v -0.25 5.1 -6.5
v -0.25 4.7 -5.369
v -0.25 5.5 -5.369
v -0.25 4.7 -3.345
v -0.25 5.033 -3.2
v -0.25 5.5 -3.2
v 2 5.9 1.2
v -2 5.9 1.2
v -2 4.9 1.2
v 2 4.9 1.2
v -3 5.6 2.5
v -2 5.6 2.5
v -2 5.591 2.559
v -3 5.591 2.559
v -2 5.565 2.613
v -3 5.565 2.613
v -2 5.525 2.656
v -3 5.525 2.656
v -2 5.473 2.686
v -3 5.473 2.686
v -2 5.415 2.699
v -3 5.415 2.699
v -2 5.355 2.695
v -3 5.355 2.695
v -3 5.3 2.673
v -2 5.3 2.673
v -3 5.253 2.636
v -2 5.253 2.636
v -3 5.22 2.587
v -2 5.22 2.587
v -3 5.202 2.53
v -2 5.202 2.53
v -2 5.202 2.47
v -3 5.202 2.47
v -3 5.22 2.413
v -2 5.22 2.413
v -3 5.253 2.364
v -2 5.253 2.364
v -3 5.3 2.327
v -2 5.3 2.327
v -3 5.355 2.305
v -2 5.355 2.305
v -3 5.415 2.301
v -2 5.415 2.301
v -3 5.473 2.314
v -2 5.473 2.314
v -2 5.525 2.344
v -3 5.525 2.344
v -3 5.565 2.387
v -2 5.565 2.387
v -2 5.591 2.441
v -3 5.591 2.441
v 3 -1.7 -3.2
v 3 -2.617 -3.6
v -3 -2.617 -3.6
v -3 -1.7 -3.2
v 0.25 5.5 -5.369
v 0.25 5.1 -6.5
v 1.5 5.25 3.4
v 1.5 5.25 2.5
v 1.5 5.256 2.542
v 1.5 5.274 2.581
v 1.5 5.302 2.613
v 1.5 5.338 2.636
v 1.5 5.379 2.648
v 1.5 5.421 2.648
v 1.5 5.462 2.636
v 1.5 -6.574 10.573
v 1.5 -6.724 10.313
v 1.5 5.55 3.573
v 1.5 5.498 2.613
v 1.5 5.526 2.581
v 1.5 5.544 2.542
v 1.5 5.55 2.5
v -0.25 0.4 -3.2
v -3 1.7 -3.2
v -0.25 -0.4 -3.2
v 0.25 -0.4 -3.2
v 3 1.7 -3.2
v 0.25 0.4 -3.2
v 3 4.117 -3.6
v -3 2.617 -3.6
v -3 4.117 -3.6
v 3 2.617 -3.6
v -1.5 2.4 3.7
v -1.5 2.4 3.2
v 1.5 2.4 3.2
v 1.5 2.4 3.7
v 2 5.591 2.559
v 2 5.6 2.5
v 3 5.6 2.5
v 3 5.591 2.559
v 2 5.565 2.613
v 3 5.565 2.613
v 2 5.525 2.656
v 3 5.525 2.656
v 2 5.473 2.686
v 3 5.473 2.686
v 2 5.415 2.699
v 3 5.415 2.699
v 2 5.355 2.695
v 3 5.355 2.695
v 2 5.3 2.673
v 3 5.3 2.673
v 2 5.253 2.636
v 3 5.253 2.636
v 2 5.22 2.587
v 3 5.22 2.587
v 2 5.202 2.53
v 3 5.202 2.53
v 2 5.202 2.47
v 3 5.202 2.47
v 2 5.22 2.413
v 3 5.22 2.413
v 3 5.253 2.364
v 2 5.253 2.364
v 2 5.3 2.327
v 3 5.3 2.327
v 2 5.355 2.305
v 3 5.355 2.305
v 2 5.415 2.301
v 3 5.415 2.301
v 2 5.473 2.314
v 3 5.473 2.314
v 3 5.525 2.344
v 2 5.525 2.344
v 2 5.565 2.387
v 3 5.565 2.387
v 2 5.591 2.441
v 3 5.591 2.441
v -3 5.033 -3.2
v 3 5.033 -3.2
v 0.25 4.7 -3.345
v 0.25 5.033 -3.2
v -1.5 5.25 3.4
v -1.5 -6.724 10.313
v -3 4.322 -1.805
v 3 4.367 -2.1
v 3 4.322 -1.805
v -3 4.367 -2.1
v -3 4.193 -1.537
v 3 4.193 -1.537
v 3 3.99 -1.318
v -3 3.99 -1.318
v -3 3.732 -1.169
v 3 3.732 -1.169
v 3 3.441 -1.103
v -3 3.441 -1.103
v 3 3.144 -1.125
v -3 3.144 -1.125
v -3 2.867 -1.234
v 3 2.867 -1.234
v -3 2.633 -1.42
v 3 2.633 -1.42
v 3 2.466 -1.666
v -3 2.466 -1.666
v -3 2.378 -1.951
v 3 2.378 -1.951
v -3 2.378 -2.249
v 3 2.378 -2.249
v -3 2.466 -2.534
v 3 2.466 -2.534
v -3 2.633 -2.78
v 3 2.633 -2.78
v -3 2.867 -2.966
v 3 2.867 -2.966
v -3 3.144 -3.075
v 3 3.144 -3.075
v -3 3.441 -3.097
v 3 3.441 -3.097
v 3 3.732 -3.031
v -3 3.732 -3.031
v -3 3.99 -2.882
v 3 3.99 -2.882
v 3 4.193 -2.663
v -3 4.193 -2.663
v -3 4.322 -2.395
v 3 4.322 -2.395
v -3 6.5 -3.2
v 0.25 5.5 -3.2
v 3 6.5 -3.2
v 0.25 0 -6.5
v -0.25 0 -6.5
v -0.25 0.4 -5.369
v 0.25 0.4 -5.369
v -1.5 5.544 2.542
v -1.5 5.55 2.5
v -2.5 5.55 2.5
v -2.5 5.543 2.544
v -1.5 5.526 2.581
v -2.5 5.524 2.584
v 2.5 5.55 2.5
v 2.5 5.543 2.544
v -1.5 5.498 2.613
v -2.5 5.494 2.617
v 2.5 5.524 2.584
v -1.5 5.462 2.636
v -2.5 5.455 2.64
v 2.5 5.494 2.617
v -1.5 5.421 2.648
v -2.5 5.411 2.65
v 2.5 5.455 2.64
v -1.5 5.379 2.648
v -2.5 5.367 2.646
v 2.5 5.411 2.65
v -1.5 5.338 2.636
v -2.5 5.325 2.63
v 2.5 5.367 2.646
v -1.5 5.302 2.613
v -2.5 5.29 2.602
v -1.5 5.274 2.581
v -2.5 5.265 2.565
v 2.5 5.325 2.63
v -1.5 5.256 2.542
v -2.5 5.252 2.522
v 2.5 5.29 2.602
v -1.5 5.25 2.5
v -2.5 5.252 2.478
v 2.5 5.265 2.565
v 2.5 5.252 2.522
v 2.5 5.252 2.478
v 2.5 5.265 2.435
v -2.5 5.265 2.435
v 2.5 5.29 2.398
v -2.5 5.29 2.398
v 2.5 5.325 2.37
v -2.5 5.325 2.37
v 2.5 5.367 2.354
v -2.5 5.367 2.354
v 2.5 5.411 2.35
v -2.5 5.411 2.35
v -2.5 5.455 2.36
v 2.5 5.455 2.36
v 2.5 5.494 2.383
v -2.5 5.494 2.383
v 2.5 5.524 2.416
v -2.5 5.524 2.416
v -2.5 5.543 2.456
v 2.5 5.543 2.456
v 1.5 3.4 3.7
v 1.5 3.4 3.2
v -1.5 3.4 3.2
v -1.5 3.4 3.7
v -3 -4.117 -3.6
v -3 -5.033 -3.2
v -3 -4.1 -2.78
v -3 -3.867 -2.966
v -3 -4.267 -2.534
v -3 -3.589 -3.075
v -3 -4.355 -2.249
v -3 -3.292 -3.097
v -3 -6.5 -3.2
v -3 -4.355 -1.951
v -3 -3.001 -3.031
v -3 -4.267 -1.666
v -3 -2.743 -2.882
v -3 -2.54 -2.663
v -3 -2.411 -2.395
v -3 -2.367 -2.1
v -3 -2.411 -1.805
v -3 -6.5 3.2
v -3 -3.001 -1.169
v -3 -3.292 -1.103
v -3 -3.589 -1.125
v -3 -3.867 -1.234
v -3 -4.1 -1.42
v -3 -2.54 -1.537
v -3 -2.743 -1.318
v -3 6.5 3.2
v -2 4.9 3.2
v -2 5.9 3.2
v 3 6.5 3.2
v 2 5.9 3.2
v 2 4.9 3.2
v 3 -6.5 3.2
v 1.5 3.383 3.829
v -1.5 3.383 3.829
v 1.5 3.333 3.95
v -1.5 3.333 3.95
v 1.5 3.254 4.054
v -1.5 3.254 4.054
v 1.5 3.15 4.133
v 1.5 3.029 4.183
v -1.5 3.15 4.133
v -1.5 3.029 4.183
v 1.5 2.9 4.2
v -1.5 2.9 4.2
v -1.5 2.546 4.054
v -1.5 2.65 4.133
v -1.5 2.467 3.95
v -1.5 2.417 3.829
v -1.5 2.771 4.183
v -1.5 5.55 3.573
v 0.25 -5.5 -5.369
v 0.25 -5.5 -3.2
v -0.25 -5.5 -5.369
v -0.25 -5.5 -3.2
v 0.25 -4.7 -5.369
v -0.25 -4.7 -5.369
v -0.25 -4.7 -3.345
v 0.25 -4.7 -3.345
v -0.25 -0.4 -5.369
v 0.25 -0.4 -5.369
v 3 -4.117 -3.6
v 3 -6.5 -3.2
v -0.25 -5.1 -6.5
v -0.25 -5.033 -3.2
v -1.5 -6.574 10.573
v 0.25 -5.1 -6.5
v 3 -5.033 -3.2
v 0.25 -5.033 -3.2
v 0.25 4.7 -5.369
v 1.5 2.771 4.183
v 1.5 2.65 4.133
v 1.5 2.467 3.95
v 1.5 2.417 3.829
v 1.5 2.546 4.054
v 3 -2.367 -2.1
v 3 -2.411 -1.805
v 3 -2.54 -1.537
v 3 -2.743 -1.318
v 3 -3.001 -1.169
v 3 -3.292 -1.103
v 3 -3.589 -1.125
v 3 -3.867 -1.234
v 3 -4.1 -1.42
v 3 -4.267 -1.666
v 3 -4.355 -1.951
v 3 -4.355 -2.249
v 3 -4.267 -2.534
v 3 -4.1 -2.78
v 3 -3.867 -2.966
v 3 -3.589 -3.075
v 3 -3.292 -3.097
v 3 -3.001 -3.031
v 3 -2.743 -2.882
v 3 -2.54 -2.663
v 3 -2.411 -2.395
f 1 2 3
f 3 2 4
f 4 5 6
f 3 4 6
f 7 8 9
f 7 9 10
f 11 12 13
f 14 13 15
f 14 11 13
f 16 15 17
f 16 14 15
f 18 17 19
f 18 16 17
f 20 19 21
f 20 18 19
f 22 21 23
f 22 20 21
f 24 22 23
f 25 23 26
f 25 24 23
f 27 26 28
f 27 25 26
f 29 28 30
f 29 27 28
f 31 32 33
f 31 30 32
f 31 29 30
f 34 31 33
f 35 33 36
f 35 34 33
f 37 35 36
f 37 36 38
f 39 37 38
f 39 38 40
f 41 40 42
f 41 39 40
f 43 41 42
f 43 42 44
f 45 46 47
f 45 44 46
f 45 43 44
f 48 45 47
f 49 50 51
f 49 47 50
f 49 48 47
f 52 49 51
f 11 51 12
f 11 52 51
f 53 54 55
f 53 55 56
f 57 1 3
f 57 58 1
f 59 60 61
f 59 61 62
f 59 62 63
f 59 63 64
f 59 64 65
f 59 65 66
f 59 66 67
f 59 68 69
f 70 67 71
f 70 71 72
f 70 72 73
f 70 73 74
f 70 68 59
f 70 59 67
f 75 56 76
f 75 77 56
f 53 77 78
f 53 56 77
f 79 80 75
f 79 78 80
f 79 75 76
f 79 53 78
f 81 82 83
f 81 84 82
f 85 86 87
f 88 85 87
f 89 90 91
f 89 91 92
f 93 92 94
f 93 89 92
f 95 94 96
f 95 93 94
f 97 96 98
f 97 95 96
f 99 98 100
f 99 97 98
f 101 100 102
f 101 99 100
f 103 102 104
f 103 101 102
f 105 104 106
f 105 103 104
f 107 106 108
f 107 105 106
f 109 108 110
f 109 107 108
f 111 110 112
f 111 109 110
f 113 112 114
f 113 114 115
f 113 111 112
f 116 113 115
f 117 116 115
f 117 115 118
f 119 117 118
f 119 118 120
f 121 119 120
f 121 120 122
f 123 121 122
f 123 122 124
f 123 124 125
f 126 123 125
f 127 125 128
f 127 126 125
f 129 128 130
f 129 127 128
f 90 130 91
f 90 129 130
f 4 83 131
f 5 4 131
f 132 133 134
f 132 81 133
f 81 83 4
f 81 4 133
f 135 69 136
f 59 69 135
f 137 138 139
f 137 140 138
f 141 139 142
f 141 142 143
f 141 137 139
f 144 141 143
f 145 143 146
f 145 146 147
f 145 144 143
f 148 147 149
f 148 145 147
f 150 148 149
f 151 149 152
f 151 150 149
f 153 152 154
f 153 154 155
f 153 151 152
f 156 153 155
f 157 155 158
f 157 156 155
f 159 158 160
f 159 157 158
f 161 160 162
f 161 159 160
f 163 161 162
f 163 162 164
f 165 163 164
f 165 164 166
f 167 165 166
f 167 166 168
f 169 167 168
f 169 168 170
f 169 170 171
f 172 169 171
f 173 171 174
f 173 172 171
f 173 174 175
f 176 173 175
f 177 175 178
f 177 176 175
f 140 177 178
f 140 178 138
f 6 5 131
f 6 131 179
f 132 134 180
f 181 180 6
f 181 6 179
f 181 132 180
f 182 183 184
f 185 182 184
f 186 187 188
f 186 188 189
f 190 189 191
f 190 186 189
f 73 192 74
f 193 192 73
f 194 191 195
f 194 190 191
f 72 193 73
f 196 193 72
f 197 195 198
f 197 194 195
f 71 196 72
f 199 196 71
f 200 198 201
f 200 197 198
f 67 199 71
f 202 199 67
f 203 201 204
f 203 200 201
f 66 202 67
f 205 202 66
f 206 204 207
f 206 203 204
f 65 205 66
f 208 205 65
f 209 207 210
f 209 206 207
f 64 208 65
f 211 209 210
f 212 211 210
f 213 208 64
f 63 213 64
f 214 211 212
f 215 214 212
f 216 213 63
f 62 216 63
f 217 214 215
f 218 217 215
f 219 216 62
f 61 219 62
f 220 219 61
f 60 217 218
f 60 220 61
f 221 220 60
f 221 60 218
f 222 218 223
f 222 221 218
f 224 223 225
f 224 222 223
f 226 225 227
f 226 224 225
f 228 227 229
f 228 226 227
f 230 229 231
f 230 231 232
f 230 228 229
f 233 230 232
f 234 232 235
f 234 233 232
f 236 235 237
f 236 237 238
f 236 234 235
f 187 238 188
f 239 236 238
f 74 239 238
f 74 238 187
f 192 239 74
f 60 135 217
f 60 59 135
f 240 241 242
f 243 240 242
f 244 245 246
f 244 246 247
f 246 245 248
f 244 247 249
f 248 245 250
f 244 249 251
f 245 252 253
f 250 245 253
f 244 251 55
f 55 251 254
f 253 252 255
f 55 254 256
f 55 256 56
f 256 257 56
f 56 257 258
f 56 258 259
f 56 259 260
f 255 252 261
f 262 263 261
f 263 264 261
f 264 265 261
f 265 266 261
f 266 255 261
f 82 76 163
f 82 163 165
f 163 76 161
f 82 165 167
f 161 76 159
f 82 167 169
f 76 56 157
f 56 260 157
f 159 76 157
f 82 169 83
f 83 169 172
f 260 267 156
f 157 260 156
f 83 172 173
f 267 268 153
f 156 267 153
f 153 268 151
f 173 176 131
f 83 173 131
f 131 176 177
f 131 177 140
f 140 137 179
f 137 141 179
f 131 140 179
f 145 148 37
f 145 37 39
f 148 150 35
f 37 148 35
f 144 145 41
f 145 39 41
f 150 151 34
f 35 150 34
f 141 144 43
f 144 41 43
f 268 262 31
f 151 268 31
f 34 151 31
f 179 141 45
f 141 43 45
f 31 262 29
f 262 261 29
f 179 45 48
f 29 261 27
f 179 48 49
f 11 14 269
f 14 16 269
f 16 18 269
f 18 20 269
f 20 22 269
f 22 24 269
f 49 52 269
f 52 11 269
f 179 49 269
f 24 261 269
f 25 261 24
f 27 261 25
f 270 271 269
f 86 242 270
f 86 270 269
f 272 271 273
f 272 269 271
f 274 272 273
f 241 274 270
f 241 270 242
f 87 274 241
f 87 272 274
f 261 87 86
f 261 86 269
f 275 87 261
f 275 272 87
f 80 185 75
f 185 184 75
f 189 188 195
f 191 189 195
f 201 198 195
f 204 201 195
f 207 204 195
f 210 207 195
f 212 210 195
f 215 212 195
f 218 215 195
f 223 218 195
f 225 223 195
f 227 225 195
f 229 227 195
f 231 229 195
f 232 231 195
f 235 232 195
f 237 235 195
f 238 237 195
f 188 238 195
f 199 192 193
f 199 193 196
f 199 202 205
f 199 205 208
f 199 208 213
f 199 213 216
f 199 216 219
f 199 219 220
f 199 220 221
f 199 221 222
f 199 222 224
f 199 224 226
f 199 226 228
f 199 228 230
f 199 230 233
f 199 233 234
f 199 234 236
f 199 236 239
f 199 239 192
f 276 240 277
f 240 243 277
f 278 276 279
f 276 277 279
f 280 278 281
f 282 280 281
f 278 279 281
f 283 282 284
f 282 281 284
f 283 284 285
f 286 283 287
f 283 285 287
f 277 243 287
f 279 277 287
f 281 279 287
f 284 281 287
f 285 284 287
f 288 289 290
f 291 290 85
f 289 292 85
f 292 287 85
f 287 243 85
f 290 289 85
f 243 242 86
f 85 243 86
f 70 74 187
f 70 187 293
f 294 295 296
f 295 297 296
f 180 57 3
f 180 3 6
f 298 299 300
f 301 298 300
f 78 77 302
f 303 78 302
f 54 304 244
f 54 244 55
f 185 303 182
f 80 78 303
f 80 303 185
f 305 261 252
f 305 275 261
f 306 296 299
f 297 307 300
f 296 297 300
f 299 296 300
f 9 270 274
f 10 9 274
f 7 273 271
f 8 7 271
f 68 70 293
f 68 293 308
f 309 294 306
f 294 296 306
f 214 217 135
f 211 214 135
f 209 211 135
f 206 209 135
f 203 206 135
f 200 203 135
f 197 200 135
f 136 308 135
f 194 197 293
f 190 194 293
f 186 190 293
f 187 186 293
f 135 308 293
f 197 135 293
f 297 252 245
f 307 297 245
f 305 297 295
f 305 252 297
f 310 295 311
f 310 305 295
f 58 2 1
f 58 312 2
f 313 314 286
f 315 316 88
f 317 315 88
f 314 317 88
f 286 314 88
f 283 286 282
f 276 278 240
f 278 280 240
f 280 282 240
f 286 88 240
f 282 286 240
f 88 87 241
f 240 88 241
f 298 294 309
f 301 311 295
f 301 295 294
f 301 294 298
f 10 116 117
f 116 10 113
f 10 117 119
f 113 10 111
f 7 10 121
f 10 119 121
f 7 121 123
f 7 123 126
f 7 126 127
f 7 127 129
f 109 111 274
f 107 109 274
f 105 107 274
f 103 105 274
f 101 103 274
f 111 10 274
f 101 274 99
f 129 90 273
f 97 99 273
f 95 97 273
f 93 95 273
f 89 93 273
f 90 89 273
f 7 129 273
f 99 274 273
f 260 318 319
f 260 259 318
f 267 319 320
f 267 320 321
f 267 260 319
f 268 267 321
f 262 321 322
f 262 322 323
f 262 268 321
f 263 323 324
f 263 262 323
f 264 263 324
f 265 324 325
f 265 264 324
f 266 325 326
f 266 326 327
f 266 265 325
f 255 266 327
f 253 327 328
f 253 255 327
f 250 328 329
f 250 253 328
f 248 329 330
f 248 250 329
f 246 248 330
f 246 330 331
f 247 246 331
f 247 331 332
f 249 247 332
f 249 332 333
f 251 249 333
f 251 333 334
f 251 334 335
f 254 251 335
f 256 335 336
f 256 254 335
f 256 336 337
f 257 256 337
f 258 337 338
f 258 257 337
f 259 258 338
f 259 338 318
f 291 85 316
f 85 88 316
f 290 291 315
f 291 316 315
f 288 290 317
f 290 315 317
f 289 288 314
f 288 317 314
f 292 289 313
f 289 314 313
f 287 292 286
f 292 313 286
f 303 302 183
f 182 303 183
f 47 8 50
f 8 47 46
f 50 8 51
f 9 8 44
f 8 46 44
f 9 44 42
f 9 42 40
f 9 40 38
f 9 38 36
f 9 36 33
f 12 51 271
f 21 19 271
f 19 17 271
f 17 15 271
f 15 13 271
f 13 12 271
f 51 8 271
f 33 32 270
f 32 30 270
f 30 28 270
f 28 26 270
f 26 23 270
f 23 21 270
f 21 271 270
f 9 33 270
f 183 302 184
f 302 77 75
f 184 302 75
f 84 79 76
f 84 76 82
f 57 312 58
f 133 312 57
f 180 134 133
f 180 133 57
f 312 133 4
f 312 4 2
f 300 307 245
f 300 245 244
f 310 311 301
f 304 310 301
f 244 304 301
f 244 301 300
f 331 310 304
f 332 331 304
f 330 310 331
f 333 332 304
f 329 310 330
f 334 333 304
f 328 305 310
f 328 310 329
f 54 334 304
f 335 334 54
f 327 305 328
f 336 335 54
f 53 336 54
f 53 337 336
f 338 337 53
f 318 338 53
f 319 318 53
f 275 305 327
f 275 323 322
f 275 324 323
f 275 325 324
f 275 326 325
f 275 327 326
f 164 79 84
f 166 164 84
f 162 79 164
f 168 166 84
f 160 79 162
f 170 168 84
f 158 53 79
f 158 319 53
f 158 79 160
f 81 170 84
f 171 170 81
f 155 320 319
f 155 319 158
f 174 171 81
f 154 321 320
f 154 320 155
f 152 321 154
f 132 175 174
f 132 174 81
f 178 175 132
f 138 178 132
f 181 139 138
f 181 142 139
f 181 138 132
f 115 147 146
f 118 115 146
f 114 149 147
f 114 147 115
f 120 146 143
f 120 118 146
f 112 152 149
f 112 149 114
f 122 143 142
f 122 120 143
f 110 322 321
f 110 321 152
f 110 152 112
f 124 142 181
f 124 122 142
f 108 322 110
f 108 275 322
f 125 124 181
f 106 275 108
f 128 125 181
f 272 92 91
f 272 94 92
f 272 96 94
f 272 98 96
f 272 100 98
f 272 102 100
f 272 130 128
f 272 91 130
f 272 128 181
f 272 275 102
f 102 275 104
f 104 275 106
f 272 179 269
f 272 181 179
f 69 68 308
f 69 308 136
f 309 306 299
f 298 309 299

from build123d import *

# Parameters (mm, degrees)
F0_R      = 1
F0_R_2    = 0.2
F1_DEPTH  = 3
F3_DEPTH  = 0.25
F5_DEPTH  = 2
F6_DEPTH  = 1
F7_R      = 0.49999
F9_DEPTH  = 1.5
F10_DEPTH = 2.5


# Not quite as in the source:
# - a fillet or chamfer is up to 0.001 mm smaller than in the source, because OpenCascade refuses the exact size


with BuildPart() as f1:
    # F0 (on Right) → F1 (new body, symmetric)
    with BuildSketch(Plane.YZ):
        Polygon((0, 3.2), (-6.5, 3.2), (-6.5, -3.2), (-5.033030278, -3.2), (-4.116515139, -3.6), (-2.616515139, -3.6), (-1.7, -3.2), (0, -3.2), (1.7, -3.2), (2.616515139, -3.6), (4.116515139, -3.6), (5.033030278, -3.2), (6.5, -3.2), (6.5, 3.2), align=None)
        with Locations((-3.366515139, -2.1)):
            Circle(F0_R, mode=Mode.SUBTRACT)
        with Locations((3.366515139, -2.1)):
            Circle(F0_R, mode=Mode.SUBTRACT)
        with Locations((5.4, 2.5)):
            Circle(F0_R_2, mode=Mode.SUBTRACT)
    extrude(amount=F1_DEPTH, both=True)

    # F2 (on Right) → F3 (join, symmetric)
    with BuildSketch(Plane.YZ):
        Polygon((-4.7, -3.2), (-5.5, -3.2), (-5.5, -5.3686291501), (-5.1, -6.5), (-4.7, -5.3686291501), align=None)
        Polygon((0, -6.5), (0.4, -5.3686291501), (0.4, -3.2), (-0.4, -3.2), (-0.4, -5.3686291501), align=None)
        Polygon((5.1, -6.5), (5.5, -5.3686291501), (5.5, -3.2), (4.7, -3.2), (4.7, -5.3686291501), align=None)
    extrude(amount=F3_DEPTH, both=True)

    # F4 (on face) → F5 (cut)
    with BuildSketch(Plane.XY.offset(3.2)):
        Polygon((2, 5.9), (0, 5.9), (-2, 5.9), (-2, 4.9), (0, 4.9), (2, 4.9), align=None)
    extrude(amount=-F5_DEPTH, mode=Mode.SUBTRACT)

    # F4 (on face) → F6 (join)
    with BuildSketch(Plane.XY.offset(3.2)):
        Polygon((1.5, 3.4), (0, 3.4), (-1.5, 3.4), (-1.5, 2.4), (0, 2.4), (1.5, 2.4), align=None)
    extrude(amount=F6_DEPTH)

    # F7 (radius 0.5 in the source; OpenCascade refuses exactly that, so slightly less here)
    f7_edges = [f1.edges().sort_by_distance(p)[0] for p in [
        (0, 3.4, 4.2),
        (0, 2.4, 4.2),
    ]]
    fillet(f7_edges, radius=F7_R)


with BuildPart() as f9:
    # F8 (on Right) → F9 (new body, symmetric)
    with BuildSketch(Plane.YZ):
        with BuildLine():
            ThreePointArc((5.25, 2.5), (5.4, 2.65), (5.55, 2.5))
            Line((5.55, 2.5), (5.55, 3.5732050808))
            Line((5.55, 3.5732050808), (-6.574355653, 10.5732050808))
            Line((-6.574355653, 10.5732050808), (-6.724355653, 10.3133974596))
            Line((-6.724355653, 10.3133974596), (5.25, 3.4))
            Line((5.25, 3.4), (5.25, 2.5))
        make_face()
    extrude(amount=F9_DEPTH, both=True)

    # F8 (on Right) → F10 (join, symmetric)
    with BuildSketch(Plane.YZ):
        with BuildLine():
            ThreePointArc((5.25, 2.5), (5.4, 2.35), (5.55, 2.5))
            ThreePointArc((5.55, 2.5), (5.4, 2.65), (5.25, 2.5))
        make_face()
    extrude(amount=F10_DEPTH, both=True)


solid = Compound([f1.part, f9.part])
